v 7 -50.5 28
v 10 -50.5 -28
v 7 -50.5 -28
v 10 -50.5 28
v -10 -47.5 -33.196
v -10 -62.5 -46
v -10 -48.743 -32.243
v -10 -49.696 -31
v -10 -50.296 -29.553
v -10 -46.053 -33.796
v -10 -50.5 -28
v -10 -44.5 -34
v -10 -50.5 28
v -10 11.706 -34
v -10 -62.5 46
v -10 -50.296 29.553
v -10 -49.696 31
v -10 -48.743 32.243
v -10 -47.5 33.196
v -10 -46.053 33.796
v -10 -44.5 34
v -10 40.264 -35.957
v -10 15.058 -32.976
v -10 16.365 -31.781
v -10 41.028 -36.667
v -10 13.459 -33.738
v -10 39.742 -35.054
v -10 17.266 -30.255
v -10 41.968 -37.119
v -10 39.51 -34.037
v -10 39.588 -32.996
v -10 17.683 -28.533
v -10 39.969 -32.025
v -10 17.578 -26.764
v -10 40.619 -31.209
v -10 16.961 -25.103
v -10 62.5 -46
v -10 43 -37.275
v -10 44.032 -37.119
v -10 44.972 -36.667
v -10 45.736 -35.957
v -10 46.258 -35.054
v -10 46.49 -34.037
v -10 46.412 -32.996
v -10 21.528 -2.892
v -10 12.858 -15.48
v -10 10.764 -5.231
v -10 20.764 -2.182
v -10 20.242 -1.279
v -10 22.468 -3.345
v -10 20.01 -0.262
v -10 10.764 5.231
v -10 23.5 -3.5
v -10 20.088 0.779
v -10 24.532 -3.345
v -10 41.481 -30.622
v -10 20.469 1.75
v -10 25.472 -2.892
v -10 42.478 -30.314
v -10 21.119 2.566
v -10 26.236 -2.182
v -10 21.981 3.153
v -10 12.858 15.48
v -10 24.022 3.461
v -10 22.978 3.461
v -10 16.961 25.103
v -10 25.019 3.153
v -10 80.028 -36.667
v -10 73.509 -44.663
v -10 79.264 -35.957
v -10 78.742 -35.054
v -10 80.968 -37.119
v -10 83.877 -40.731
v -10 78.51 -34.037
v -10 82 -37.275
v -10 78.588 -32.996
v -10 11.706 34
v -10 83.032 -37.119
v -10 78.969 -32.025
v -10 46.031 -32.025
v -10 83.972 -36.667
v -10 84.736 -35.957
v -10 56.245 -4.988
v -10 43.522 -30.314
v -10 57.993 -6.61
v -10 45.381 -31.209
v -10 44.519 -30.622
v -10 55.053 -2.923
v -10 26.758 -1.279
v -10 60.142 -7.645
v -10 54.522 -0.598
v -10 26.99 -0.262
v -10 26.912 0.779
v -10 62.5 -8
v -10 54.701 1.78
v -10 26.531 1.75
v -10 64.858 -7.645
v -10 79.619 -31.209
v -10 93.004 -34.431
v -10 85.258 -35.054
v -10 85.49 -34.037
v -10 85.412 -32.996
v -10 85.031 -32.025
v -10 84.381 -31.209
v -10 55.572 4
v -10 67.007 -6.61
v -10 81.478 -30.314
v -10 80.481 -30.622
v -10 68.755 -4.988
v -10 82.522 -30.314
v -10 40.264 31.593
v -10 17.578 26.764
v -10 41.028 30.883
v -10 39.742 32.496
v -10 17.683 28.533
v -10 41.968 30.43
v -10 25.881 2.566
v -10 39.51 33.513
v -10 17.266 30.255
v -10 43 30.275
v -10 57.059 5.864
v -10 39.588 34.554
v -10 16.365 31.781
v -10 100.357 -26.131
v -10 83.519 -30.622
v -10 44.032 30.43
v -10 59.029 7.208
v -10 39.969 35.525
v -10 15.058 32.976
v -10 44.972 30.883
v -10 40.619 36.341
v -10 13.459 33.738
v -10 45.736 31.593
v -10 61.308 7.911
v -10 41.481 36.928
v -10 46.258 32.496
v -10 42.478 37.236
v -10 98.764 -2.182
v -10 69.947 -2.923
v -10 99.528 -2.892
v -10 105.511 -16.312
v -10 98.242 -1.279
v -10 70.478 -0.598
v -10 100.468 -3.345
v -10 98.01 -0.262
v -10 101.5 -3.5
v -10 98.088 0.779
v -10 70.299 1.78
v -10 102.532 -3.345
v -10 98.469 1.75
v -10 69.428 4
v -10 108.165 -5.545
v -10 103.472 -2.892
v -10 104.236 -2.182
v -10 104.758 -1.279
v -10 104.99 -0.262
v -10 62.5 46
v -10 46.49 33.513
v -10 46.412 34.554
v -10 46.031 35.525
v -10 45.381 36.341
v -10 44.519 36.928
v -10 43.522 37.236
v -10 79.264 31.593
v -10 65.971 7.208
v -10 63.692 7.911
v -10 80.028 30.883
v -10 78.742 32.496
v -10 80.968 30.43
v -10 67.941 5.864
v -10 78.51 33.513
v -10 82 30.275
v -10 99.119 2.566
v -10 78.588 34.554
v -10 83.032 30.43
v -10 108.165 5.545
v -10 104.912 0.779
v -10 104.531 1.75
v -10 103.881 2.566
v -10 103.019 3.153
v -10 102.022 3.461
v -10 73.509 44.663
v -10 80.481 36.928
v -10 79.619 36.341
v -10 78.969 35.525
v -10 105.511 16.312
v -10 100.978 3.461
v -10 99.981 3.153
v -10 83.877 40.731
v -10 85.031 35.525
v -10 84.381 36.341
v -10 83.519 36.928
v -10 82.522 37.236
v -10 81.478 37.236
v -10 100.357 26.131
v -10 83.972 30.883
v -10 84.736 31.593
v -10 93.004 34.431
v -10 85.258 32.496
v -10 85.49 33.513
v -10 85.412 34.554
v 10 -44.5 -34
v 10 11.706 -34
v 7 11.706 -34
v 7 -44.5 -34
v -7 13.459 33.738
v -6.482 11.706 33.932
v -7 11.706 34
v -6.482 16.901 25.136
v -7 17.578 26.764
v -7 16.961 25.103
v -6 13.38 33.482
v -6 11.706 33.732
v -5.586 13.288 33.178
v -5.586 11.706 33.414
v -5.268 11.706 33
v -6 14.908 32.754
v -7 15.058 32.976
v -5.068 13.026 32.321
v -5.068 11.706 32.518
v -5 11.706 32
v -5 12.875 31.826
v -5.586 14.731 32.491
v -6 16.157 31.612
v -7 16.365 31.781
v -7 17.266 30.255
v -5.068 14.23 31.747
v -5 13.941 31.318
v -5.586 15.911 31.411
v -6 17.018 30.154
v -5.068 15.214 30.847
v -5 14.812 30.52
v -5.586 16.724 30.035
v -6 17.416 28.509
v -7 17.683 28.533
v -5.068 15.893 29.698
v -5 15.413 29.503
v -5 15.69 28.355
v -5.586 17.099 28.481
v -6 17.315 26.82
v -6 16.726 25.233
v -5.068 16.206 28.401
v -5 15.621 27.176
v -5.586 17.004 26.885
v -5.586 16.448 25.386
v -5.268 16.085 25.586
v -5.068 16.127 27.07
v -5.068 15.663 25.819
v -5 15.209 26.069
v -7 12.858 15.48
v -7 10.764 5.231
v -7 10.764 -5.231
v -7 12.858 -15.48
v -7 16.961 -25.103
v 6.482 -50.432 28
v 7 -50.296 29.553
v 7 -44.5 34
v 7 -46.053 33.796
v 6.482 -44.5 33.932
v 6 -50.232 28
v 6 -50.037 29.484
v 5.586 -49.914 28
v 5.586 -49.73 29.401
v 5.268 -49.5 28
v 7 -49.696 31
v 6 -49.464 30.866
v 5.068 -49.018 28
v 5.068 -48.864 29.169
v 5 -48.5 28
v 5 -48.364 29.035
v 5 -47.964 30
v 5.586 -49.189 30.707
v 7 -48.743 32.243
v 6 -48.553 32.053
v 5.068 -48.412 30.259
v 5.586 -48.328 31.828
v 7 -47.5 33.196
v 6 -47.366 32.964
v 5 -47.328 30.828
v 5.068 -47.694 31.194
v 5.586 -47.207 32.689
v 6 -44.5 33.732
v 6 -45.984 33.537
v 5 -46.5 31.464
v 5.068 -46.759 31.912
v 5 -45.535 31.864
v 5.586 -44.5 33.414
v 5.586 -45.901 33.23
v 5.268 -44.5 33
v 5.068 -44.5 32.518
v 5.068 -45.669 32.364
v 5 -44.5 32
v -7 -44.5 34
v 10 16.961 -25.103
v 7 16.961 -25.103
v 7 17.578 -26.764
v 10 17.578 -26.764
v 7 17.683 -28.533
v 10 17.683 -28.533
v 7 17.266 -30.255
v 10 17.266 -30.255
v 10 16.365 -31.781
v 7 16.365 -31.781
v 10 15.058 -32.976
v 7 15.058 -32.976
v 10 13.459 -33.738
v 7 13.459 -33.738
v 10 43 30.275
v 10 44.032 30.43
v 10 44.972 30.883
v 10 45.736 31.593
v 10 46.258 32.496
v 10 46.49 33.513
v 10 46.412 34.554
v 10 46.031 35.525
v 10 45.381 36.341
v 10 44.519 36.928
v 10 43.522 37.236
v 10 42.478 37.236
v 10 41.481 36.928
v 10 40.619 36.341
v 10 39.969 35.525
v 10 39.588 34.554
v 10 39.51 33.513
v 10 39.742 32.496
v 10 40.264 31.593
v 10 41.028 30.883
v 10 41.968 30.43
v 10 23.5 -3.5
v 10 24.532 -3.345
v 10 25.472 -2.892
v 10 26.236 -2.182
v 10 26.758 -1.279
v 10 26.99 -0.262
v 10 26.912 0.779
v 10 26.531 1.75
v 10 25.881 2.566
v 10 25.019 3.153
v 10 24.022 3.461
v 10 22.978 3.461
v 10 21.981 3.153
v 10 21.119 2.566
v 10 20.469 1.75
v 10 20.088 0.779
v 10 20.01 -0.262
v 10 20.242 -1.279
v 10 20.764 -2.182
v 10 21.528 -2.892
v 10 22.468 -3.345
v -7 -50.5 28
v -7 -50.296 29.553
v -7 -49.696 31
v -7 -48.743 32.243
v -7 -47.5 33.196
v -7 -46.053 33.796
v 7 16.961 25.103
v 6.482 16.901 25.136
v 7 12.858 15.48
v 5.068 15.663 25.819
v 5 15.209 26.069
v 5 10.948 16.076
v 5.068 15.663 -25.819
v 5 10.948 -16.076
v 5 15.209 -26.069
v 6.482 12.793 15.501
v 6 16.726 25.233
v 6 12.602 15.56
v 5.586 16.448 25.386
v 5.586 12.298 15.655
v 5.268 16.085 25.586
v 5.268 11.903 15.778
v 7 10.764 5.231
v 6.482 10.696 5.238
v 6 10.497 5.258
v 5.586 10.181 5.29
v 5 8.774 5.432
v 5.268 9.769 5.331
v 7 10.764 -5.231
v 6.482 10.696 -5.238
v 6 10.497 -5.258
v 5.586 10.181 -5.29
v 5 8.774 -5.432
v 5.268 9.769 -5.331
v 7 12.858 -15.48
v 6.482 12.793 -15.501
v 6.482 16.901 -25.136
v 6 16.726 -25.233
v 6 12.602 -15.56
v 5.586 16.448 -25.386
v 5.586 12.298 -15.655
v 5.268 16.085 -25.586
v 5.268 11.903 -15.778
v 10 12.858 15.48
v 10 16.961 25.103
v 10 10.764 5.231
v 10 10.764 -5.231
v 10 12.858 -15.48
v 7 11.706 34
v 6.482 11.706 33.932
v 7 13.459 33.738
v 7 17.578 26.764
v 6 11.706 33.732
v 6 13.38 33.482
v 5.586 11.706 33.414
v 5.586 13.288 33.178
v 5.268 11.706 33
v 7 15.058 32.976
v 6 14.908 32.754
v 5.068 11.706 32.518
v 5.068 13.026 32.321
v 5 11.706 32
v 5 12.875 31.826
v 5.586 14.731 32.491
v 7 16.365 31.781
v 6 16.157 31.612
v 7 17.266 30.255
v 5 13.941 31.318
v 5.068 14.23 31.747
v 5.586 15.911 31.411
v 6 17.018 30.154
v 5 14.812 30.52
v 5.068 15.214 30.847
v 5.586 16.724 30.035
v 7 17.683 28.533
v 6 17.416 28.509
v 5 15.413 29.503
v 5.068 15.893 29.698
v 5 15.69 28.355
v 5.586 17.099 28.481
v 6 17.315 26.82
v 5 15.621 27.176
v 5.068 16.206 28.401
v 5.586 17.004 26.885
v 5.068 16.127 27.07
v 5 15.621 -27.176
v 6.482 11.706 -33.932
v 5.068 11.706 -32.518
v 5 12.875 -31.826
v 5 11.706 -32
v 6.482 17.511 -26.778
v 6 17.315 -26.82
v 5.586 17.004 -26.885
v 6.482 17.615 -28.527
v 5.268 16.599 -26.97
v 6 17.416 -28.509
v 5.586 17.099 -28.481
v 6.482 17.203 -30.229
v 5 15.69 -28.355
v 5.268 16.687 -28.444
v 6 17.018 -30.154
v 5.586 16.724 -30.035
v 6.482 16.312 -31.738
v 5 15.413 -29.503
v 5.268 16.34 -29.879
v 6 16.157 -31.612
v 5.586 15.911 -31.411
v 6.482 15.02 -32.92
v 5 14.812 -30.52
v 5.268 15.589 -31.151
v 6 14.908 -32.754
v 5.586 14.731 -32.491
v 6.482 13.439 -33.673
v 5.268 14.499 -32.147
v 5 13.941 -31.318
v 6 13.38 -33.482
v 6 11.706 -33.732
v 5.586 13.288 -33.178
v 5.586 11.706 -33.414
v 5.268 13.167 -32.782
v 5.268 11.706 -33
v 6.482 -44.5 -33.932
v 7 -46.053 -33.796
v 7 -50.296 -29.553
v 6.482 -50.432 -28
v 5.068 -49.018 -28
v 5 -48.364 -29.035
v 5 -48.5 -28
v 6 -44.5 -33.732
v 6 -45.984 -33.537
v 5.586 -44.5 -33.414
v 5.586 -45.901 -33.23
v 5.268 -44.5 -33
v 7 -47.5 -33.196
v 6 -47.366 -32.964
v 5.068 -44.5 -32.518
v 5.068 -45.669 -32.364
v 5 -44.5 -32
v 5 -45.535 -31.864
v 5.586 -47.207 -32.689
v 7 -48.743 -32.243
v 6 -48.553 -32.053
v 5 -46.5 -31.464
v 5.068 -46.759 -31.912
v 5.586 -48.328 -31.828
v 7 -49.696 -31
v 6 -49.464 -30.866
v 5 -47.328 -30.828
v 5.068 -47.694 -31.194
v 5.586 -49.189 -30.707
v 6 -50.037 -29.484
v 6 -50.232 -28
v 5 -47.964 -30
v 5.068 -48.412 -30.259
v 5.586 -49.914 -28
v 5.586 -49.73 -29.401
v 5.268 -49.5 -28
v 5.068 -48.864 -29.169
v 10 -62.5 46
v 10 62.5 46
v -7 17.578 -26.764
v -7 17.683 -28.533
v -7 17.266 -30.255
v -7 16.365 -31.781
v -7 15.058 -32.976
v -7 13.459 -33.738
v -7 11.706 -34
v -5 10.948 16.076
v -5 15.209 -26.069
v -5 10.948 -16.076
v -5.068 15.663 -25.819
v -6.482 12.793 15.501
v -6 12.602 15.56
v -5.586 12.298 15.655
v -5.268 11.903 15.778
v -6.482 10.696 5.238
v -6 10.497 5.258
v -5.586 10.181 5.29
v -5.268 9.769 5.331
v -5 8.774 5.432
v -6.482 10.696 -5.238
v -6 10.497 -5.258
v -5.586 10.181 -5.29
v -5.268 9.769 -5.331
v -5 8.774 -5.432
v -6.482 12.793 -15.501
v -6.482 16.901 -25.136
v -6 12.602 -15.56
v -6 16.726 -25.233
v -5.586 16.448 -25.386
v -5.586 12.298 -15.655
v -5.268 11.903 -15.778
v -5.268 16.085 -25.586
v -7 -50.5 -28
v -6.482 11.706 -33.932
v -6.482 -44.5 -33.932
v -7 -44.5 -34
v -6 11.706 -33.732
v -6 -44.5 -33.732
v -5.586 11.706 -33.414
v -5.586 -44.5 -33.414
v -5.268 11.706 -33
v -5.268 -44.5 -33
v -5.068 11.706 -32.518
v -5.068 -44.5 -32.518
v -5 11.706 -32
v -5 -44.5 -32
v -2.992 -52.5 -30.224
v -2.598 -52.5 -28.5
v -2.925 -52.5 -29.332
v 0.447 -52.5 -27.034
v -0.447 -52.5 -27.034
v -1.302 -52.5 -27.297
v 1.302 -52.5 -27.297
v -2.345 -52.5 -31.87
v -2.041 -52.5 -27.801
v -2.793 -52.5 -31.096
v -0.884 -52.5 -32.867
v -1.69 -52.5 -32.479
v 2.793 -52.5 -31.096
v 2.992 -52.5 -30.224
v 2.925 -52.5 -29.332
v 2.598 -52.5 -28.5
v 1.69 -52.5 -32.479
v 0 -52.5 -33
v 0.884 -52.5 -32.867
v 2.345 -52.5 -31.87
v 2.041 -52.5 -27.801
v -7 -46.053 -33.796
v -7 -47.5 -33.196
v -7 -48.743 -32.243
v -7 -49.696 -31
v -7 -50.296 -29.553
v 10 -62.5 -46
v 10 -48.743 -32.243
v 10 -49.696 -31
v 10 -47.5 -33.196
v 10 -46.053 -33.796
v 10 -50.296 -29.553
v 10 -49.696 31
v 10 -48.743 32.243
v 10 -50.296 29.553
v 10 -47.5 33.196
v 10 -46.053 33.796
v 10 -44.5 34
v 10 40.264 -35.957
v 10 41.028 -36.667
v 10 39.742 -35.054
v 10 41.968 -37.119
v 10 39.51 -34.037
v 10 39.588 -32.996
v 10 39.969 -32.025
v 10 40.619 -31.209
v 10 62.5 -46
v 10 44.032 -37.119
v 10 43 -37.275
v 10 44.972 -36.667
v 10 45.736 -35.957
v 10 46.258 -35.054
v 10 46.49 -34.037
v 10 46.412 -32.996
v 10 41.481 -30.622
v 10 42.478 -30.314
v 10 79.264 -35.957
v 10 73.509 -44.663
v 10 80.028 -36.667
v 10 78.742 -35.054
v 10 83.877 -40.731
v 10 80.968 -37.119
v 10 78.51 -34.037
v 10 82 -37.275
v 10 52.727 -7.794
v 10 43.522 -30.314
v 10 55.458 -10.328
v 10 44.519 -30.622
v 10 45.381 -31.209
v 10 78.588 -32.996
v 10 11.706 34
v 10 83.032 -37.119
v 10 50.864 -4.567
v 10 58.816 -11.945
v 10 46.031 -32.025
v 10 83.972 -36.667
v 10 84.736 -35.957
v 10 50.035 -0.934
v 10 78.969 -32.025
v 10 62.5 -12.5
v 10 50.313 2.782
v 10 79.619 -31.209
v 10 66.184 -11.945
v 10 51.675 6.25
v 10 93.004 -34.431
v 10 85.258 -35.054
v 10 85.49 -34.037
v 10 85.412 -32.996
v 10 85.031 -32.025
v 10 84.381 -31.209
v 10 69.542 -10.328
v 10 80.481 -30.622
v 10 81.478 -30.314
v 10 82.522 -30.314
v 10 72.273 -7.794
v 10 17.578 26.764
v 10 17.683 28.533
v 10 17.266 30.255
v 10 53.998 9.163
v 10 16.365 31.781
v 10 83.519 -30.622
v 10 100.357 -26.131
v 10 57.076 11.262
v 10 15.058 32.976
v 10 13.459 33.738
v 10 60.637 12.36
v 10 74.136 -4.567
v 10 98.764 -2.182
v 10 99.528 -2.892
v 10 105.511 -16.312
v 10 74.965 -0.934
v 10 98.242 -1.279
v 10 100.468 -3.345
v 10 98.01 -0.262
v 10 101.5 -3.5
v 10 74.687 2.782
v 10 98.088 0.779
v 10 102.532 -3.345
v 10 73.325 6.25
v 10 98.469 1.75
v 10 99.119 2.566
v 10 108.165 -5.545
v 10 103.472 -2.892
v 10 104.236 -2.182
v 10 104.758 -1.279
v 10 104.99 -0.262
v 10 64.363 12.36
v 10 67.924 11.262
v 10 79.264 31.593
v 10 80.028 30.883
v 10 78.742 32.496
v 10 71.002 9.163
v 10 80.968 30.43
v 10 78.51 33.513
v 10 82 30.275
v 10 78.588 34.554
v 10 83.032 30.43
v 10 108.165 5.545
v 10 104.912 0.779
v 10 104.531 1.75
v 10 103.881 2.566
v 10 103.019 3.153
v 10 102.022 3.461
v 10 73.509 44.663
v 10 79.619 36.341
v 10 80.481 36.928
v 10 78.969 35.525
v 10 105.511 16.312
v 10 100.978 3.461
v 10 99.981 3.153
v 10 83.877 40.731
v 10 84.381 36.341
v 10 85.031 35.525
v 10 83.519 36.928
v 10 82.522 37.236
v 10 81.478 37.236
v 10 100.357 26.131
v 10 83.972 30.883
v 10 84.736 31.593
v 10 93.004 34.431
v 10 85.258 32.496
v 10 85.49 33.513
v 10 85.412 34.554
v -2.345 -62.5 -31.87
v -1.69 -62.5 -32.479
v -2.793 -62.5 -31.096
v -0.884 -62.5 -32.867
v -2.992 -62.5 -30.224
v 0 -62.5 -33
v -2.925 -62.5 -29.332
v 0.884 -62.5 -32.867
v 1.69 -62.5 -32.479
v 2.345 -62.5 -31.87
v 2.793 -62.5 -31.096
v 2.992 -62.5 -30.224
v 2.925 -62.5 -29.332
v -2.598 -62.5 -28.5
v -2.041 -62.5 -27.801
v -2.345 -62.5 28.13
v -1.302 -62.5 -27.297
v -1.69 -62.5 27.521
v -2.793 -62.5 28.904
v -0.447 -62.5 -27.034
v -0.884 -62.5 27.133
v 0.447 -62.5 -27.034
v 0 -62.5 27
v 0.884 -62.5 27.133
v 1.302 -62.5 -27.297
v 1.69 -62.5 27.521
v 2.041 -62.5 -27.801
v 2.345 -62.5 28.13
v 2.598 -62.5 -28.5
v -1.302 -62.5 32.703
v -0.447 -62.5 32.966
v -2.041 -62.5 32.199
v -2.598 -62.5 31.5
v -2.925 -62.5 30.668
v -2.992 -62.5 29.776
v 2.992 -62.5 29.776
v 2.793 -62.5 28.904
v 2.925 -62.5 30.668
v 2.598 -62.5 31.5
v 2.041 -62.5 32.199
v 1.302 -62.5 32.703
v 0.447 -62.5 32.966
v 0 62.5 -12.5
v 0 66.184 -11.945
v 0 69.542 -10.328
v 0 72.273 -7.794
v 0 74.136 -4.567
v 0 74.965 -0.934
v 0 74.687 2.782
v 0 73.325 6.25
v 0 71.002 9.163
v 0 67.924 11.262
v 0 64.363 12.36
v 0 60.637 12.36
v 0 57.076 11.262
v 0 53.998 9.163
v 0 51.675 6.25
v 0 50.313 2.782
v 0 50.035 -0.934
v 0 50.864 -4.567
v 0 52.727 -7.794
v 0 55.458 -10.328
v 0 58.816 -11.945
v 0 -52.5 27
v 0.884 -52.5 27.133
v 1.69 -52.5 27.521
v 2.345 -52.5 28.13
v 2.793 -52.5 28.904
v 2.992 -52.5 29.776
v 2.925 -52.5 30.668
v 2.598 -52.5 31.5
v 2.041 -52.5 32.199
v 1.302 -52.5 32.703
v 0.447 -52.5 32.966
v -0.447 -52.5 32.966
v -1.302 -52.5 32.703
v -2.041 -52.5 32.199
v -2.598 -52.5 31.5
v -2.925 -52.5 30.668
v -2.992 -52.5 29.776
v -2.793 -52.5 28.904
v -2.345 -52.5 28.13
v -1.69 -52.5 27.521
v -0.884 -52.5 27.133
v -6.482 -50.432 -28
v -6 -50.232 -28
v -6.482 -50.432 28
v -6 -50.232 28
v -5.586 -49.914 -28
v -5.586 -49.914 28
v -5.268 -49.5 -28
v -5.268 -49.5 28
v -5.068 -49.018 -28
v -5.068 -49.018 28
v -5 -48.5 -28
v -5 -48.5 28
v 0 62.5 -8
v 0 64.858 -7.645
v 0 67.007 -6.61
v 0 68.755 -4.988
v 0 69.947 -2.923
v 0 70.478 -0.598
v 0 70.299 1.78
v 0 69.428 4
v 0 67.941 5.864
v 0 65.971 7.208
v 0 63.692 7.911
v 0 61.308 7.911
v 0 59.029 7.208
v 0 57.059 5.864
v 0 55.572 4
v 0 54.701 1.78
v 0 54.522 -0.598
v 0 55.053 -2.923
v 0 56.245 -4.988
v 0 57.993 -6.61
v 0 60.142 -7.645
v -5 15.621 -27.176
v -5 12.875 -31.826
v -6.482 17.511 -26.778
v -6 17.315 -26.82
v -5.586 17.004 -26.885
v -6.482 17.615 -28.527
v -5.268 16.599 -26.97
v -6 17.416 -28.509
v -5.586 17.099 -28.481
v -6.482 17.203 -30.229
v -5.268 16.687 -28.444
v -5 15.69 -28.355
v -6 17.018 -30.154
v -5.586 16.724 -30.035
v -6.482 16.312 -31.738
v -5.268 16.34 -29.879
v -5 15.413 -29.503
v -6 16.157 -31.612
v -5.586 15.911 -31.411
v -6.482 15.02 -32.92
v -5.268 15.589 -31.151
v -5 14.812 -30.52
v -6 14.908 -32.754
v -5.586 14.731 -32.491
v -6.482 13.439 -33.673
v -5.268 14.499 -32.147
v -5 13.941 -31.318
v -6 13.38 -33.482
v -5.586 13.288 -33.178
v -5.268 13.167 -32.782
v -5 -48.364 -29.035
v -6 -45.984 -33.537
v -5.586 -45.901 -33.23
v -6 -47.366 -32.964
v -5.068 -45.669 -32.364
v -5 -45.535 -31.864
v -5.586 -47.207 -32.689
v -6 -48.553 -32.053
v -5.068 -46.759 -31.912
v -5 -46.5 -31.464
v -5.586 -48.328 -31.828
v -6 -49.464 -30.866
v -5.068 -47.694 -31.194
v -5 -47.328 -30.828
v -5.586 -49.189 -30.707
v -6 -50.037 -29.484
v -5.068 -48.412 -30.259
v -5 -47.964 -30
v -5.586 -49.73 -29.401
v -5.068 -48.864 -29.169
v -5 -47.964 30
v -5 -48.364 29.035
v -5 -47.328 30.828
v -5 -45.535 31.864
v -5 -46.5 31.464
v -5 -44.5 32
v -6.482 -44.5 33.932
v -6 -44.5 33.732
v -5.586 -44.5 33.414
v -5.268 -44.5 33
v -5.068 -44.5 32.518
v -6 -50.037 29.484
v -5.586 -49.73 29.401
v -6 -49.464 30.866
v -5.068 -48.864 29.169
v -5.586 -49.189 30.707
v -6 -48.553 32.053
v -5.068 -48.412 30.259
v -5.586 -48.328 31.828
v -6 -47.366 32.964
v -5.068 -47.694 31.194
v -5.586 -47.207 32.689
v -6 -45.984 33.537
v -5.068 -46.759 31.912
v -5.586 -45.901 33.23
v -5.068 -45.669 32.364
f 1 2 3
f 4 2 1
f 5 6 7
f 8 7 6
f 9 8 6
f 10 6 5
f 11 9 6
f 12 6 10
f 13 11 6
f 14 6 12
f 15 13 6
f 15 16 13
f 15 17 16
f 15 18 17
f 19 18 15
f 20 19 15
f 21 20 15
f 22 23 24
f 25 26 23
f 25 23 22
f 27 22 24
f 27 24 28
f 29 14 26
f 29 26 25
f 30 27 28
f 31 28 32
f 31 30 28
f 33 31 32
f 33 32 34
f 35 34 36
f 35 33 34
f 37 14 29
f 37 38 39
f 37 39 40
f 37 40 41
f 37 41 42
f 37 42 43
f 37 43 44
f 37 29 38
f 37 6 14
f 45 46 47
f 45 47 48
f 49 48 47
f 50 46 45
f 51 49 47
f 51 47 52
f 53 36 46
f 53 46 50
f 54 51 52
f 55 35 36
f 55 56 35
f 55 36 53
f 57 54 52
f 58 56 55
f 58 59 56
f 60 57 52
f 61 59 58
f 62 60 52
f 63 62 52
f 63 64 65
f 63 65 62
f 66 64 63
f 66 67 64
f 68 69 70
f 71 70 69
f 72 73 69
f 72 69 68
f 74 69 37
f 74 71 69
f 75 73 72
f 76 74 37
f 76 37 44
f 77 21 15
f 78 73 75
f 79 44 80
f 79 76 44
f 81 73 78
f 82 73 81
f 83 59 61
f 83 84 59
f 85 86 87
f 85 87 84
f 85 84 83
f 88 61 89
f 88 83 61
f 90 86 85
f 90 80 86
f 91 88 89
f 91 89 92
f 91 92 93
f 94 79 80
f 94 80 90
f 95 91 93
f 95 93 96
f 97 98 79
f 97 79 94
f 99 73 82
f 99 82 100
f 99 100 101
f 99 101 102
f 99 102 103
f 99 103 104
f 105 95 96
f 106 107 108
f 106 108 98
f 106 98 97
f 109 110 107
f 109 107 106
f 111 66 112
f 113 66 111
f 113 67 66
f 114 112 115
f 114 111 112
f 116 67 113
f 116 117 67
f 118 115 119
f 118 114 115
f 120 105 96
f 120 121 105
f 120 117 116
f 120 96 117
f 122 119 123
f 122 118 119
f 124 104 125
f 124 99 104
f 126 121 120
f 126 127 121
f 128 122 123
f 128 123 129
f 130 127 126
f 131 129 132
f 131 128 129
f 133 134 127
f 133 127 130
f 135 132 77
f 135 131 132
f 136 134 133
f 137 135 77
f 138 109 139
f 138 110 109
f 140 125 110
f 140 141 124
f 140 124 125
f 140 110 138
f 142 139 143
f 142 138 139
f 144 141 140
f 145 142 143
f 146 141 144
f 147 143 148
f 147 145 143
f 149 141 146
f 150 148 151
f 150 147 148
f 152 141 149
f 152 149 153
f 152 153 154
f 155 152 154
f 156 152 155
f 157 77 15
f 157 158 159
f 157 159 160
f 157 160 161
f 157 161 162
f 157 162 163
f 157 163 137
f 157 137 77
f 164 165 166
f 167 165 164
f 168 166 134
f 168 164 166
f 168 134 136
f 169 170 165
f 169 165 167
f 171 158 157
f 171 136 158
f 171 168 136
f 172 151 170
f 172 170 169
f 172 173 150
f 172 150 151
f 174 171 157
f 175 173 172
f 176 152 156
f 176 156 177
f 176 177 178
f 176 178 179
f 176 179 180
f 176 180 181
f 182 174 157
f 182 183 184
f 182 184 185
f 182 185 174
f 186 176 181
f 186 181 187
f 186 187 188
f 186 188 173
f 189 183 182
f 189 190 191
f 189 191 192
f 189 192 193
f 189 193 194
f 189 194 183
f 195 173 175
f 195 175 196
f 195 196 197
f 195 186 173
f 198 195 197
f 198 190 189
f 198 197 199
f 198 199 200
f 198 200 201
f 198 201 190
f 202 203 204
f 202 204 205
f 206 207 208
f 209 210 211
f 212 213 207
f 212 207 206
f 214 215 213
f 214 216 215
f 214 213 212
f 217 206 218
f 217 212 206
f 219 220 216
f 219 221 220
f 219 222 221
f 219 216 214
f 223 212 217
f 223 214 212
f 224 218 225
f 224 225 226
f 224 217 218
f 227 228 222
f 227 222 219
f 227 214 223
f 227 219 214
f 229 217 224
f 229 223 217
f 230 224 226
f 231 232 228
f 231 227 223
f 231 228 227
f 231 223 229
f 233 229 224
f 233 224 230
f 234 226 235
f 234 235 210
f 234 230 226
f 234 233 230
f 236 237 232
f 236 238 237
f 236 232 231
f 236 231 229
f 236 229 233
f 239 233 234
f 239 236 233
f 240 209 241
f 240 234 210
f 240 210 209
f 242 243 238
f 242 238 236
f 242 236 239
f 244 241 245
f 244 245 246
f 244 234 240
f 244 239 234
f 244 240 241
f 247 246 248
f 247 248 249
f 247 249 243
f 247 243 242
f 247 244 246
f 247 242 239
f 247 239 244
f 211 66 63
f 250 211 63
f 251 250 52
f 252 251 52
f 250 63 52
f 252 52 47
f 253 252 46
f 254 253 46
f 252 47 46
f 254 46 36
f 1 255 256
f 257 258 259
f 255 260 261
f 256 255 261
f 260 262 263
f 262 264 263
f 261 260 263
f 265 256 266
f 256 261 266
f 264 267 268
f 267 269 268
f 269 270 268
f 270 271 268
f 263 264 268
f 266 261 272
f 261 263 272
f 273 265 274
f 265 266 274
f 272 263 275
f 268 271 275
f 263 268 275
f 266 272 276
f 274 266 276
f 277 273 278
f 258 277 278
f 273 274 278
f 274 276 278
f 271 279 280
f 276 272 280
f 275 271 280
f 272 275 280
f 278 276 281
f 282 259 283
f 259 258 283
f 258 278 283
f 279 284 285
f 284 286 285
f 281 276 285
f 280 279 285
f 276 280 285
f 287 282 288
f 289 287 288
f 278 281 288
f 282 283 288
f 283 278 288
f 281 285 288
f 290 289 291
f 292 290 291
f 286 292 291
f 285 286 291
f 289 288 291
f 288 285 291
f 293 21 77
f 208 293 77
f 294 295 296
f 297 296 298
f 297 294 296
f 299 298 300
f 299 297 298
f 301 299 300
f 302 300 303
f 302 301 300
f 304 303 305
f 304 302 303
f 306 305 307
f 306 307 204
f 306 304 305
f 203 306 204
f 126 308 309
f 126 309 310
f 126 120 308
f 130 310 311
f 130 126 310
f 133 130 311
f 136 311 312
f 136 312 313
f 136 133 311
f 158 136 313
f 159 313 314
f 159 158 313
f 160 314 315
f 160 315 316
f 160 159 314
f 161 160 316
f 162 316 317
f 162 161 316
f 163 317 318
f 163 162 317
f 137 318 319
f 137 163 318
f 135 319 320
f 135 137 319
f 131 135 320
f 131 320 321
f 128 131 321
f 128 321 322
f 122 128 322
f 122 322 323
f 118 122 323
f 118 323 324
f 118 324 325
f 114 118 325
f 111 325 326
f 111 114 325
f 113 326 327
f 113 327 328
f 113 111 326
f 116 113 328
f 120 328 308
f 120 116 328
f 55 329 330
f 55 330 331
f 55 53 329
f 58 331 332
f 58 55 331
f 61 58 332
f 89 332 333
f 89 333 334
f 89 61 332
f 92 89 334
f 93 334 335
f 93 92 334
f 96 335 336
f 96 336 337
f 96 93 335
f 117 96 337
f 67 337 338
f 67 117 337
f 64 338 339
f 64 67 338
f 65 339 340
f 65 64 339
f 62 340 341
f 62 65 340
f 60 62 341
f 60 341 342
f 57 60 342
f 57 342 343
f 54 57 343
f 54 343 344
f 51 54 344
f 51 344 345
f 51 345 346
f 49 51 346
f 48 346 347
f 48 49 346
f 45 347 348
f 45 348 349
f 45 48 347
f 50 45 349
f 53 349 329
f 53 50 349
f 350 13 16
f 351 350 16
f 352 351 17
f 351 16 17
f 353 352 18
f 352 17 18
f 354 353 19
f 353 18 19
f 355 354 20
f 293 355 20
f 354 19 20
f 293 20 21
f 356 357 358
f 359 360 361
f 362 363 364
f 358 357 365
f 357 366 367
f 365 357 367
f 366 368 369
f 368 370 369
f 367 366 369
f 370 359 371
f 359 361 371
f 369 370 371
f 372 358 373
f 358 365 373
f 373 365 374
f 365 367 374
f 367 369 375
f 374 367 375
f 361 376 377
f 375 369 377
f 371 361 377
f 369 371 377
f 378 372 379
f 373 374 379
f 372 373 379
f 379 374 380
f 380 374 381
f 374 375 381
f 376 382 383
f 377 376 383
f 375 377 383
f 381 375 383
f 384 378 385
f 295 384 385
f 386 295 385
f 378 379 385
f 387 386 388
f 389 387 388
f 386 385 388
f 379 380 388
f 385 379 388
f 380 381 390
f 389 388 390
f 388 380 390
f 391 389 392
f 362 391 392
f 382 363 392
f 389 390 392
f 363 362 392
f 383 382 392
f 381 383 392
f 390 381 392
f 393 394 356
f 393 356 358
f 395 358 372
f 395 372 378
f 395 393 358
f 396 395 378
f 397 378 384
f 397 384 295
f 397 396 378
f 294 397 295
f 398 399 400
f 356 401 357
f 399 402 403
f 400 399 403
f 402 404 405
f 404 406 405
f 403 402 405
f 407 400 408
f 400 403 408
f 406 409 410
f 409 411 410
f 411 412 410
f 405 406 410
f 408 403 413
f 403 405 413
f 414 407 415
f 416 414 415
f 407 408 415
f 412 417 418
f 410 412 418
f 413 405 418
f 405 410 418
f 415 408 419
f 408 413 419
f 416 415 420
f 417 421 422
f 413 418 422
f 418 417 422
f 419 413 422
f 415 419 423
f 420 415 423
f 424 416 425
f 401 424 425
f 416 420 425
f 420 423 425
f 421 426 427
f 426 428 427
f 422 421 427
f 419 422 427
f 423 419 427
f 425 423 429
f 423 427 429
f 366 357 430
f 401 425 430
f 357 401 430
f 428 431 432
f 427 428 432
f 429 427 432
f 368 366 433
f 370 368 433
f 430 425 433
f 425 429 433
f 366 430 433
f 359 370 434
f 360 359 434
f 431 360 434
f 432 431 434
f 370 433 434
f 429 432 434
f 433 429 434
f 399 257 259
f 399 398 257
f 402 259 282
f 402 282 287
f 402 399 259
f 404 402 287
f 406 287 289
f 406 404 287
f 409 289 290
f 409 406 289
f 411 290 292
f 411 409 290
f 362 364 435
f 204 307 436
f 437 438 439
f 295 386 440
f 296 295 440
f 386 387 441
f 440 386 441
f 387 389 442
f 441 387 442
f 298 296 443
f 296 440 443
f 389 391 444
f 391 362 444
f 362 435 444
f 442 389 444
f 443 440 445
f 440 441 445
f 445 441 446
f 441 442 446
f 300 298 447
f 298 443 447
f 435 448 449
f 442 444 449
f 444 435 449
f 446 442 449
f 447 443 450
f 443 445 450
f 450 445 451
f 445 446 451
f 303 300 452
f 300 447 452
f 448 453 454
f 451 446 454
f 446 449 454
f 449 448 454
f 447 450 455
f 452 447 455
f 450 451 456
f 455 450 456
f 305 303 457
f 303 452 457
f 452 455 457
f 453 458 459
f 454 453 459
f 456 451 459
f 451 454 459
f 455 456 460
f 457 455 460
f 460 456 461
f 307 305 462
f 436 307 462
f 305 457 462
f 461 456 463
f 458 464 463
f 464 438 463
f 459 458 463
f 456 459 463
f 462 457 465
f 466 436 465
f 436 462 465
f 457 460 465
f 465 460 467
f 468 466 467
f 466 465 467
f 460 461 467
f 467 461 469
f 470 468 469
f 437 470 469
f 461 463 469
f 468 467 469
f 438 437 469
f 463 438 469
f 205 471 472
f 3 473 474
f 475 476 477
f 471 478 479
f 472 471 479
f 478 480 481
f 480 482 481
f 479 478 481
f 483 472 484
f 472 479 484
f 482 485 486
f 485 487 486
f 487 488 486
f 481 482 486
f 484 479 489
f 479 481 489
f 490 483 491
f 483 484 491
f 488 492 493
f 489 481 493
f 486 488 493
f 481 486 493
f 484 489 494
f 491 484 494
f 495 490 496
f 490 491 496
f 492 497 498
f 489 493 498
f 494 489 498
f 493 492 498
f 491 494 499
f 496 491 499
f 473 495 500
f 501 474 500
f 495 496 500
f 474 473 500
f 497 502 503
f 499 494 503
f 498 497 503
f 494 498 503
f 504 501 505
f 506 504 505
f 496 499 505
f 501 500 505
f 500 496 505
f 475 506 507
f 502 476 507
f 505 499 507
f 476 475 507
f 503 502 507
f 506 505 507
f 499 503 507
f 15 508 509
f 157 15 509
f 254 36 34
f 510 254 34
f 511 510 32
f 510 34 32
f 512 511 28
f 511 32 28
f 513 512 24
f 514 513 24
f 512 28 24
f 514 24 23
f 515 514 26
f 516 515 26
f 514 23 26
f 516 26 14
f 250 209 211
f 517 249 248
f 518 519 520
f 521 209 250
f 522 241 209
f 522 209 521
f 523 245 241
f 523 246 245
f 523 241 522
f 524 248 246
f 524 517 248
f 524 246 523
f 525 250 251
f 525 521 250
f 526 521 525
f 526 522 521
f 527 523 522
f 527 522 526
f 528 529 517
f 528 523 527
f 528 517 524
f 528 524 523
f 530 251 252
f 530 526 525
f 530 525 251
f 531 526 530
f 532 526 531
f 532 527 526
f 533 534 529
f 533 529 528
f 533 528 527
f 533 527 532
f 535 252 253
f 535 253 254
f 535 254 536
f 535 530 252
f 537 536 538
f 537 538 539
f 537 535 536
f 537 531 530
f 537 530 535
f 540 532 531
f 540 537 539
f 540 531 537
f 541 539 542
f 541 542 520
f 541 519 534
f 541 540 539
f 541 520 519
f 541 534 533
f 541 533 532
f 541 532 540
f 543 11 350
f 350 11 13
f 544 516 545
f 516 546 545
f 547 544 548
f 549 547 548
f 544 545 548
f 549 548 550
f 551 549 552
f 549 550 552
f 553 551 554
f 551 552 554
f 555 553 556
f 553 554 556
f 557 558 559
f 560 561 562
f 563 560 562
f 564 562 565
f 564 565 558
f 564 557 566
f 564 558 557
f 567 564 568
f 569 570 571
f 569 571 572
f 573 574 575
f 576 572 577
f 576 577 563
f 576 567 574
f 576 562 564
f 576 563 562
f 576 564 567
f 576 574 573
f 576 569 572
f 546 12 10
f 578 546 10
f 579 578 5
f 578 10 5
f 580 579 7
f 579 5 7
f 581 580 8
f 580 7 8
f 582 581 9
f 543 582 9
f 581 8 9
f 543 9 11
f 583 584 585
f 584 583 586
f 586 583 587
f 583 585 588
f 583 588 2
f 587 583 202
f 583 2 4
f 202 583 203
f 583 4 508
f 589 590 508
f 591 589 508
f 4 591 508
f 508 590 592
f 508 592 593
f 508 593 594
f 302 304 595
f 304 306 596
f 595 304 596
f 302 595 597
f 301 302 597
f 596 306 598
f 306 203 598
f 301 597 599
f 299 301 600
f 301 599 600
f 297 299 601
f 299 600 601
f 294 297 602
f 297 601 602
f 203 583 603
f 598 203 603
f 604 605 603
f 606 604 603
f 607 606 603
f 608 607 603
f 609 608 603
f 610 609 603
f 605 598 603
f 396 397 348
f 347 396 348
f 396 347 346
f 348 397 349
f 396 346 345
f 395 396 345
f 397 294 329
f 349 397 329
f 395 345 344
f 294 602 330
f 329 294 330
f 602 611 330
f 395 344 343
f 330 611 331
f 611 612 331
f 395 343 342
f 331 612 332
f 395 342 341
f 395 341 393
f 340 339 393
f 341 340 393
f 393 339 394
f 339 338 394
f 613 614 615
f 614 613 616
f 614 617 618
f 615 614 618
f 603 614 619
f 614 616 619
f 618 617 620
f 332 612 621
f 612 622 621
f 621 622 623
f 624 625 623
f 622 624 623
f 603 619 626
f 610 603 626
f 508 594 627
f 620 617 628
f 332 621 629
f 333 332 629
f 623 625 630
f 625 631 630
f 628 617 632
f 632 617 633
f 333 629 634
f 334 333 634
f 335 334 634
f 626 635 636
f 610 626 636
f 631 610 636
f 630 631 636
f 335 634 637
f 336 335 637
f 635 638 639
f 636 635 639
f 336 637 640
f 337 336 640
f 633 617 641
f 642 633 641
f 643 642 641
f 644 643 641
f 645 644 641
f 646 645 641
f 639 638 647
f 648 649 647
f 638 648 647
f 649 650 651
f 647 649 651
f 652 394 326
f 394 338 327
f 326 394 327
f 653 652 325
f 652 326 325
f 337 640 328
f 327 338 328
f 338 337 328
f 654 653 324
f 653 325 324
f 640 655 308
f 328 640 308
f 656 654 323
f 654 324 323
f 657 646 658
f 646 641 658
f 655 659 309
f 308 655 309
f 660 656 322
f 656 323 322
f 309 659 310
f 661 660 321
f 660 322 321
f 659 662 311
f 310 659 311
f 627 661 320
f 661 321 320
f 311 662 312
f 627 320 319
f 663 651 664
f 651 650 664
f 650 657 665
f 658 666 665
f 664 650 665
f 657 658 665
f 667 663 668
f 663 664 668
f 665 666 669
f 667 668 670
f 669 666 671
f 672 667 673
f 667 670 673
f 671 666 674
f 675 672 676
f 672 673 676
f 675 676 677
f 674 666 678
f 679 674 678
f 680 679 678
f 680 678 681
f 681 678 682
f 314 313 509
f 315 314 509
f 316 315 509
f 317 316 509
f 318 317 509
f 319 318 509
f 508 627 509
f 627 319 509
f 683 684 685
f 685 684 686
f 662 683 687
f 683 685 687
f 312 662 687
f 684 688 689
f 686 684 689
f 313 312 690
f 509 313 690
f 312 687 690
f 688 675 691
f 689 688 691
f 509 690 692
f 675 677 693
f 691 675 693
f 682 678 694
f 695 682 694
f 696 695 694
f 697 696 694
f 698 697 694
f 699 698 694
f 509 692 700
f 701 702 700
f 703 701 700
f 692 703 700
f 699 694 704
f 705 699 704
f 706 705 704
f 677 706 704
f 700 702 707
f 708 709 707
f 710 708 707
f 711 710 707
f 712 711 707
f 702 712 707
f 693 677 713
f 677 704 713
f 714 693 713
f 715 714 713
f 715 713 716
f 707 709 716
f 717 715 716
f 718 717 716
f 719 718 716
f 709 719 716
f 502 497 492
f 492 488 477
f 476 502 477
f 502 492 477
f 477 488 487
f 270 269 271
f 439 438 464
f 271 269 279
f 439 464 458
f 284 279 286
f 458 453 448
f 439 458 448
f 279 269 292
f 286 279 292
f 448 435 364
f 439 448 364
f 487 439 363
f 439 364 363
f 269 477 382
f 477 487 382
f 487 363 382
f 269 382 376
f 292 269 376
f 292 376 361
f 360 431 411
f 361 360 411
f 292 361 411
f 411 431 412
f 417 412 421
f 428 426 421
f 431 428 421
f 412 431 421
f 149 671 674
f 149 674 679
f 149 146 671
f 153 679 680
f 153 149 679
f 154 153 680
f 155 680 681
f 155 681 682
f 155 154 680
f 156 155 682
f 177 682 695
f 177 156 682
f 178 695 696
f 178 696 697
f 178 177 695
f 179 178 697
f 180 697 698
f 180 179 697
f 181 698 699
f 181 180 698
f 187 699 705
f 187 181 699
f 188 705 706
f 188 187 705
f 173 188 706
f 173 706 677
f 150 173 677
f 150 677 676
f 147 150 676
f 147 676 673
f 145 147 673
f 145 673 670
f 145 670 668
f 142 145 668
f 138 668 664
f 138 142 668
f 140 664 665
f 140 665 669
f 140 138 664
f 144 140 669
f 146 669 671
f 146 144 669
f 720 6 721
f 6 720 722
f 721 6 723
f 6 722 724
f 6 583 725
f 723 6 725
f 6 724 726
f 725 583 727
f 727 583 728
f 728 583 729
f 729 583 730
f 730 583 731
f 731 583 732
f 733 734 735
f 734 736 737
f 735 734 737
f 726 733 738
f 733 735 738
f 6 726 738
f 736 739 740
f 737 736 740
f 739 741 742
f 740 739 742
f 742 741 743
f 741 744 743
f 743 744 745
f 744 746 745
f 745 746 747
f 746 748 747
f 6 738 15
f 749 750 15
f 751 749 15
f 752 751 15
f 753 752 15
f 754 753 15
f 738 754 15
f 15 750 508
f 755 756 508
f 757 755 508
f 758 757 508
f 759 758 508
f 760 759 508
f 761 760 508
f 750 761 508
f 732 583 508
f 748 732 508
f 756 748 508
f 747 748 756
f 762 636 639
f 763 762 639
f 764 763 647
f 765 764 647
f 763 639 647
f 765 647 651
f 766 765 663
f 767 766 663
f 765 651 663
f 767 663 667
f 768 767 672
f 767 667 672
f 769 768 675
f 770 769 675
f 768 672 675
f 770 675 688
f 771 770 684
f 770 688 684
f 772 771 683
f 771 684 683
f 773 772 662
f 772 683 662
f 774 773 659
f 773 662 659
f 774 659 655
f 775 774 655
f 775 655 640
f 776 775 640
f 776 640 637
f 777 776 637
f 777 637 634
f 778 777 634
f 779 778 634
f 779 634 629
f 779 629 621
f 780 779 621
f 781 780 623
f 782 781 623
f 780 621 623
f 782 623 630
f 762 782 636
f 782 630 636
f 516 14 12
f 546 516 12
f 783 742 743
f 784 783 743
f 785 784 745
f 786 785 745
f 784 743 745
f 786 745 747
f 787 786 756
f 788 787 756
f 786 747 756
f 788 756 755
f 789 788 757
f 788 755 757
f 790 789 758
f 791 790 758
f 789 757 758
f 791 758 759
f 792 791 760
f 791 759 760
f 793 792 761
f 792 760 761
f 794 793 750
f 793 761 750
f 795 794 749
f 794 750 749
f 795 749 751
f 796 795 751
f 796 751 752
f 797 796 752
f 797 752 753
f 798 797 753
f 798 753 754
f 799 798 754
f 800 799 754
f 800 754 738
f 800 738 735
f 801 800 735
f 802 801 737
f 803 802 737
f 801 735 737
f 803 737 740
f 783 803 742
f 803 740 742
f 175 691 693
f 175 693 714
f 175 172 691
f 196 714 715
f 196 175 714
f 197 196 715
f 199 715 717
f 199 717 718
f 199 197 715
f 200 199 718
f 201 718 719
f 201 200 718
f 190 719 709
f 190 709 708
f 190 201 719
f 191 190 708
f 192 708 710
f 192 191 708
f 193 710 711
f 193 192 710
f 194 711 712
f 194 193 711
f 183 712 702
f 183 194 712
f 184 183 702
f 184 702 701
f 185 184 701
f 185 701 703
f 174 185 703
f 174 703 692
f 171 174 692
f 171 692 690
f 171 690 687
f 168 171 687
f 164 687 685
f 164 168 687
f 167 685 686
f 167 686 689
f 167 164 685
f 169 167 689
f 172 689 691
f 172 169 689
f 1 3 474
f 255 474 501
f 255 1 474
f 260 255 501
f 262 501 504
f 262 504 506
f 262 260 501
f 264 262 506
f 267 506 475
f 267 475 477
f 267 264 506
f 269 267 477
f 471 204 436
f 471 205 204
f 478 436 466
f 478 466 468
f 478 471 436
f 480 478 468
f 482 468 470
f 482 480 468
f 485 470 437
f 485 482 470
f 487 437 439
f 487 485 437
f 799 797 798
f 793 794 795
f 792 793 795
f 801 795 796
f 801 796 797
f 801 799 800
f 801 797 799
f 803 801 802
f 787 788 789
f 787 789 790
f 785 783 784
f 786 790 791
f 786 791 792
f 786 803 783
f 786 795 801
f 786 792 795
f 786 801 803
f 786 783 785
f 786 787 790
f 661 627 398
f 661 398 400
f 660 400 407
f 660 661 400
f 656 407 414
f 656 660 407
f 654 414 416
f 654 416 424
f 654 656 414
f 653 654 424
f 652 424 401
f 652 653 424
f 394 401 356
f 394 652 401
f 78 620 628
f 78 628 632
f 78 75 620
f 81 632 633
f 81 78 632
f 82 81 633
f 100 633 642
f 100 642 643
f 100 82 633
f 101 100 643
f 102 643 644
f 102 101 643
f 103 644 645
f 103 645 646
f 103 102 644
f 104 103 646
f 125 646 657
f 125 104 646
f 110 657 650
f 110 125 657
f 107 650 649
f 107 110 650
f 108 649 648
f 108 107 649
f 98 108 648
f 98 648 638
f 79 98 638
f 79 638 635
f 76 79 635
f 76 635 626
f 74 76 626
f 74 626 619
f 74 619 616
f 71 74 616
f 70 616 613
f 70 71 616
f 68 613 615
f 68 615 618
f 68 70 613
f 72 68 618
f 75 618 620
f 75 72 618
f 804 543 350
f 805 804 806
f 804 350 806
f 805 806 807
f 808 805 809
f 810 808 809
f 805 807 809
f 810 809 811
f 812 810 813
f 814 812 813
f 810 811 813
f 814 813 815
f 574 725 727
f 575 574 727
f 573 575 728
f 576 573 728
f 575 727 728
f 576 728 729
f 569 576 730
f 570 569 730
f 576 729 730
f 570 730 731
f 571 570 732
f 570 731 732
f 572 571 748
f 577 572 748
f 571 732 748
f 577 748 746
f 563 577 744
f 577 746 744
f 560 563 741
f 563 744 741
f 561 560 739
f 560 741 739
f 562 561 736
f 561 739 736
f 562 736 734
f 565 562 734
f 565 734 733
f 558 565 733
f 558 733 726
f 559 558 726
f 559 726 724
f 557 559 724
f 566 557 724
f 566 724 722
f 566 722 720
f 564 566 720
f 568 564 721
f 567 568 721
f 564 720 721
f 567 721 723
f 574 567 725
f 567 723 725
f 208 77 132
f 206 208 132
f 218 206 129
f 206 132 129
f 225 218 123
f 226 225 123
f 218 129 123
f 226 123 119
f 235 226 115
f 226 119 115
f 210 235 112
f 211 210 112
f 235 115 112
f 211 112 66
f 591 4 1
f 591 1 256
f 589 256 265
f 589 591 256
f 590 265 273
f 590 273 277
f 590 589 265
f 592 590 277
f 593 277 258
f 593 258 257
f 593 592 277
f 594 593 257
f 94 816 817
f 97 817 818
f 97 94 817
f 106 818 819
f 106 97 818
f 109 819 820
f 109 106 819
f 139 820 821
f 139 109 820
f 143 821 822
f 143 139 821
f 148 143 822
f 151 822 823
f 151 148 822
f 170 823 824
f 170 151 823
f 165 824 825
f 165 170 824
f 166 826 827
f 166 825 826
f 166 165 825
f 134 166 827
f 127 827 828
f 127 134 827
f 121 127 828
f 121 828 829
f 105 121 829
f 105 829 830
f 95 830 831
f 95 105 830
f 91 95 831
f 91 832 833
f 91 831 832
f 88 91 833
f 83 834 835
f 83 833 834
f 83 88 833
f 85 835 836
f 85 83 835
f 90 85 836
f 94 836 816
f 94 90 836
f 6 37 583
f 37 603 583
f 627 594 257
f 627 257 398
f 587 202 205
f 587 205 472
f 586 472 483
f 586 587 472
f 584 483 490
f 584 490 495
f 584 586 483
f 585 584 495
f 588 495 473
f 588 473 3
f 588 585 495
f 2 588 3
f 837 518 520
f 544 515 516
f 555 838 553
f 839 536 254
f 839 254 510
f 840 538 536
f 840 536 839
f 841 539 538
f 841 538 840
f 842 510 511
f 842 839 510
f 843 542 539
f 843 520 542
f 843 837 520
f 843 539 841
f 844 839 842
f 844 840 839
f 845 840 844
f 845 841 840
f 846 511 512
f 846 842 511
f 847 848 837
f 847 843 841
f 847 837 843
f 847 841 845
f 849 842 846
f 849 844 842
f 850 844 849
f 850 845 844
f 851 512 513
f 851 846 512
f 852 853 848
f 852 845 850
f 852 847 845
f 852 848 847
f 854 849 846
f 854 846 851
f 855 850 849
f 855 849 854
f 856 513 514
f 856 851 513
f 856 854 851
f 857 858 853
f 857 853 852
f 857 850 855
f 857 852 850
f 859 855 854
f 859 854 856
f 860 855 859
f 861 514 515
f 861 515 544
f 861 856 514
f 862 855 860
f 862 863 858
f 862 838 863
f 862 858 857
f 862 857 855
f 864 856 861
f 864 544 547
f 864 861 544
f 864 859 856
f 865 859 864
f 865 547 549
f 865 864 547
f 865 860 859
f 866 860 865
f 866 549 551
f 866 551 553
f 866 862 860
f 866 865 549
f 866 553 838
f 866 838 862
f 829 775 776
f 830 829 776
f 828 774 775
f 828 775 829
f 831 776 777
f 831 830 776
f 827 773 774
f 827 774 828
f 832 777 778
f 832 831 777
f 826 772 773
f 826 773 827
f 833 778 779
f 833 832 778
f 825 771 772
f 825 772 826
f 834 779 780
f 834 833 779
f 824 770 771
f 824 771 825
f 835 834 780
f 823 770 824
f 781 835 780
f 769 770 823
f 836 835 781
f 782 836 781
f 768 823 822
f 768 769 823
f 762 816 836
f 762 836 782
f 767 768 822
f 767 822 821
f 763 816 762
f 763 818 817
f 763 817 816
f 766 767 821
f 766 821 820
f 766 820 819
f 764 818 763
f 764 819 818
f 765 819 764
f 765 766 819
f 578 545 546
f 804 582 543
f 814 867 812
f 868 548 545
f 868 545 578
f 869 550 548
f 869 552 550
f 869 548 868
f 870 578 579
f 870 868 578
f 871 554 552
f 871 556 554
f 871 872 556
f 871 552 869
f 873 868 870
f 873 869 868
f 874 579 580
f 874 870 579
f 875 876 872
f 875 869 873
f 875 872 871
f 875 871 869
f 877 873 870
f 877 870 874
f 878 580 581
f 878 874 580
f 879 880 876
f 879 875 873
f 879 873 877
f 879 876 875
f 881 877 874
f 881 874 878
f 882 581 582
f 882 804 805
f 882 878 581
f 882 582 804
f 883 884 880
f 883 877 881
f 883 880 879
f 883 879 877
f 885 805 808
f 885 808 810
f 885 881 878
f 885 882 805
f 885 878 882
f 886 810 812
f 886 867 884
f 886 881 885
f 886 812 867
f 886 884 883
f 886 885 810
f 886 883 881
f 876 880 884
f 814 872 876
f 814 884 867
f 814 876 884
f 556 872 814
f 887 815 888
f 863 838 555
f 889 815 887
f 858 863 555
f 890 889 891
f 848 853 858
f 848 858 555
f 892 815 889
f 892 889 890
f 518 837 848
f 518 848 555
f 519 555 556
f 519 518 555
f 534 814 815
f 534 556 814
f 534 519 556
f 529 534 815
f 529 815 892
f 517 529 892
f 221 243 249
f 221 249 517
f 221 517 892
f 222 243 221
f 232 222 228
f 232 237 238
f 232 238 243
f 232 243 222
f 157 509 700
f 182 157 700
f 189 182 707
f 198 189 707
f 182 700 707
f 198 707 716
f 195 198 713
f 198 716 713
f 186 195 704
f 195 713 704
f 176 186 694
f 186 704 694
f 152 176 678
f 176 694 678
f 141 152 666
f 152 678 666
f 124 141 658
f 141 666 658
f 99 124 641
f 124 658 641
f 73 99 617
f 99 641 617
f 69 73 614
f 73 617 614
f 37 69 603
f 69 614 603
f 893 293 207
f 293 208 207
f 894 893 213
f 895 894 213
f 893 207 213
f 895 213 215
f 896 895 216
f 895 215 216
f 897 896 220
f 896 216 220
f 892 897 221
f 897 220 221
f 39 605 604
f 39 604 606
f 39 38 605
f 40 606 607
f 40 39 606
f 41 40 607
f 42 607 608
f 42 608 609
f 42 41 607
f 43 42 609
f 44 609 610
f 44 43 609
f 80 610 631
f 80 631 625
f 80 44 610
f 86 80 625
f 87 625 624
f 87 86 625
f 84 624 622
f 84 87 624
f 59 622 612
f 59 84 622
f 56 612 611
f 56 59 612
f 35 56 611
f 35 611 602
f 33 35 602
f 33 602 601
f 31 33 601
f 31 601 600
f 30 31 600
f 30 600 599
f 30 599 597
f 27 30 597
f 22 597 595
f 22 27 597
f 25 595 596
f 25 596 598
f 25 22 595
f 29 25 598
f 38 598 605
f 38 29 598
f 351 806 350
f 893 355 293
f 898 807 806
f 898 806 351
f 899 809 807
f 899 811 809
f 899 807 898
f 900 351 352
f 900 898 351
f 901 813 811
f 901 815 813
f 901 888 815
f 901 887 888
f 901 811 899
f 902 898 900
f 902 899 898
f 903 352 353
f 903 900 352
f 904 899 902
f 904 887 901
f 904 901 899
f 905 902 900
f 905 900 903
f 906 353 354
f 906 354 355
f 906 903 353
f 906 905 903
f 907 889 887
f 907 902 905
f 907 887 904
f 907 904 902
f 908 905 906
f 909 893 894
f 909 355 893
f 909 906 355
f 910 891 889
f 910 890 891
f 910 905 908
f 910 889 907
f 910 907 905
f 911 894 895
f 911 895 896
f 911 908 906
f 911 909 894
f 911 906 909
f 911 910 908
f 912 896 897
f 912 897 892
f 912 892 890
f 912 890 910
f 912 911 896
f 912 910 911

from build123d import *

# Parameters (mm, degrees)
SKETCH1_R            = 3.5
SKETCH1_R_2          = 8
BOSS_EXTRUDE1_DEPTH  = 10
CUT_EXTRUDE1_DEPTH   = 5
FILLET1_R            = 2
SKETCH3_R            = 12.5
CUT_EXTRUDE2_DEPTH   = 10
FILLET1_OF_MIRROR1_R = 2
SKETCH6_R            = 3
CUT_EXTRUDE3_DEPTH   = 10


with BuildPart() as part:
    # Sketch1 → Boss-Extrude1 (new, symmetric)
    # profile 1 of 2: a face of its own
    with BuildSketch(Plane(origin=(0, 0, 0), x_dir=(0, 0, -1), z_dir=(1, 0, 0))):
        with BuildLine():
            ThreePointArc((-46, 62.5), (0, 108.5), (46, 62.5))
            Line((46, 62.5), (46, -62.5))
            Line((46, -62.5), (-46, -62.5))
            Line((-46, -62.5), (-46, 62.5))
        make_face()
        with Locations((-33.774990748, 82)):
            Circle(SKETCH1_R, mode=Mode.SUBTRACT)
        with Locations((-33.774990748, 43)):
            Circle(SKETCH1_R, mode=Mode.SUBTRACT)
        with Locations((0, 23.5)):
            Circle(SKETCH1_R, mode=Mode.SUBTRACT)
        with Locations((33.774990748, 43)):
            Circle(SKETCH1_R, mode=Mode.SUBTRACT)
        with Locations((33.774990748, 82)):
            Circle(SKETCH1_R, mode=Mode.SUBTRACT)
        with Locations((0, 62.5)):
            Circle(SKETCH1_R_2, mode=Mode.SUBTRACT)
        with Locations((0, 101.5)):
            Circle(SKETCH1_R, mode=Mode.SUBTRACT)
        with BuildLine():
            ThreePointArc((-25.103448276, 16.960820334), (-31.051285766, 16.872502771), (-34, 11.706299603))
            Line((-34, 11.706299603), (-34, -44.5))
            ThreePointArc((-34, -44.5), (-32.242640687, -48.742640687), (-28, -50.5))
            Line((-28, -50.5), (28, -50.5))
            ThreePointArc((28, -50.5), (32.242640687, -48.742640687), (34, -44.5))
            Line((34, -44.5), (34, 11.706299603))
            ThreePointArc((34, 11.706299603), (31.051285766, 16.872502771), (25.103448276, 16.960820334))
            ThreePointArc((25.103448276, 16.960820334), (0, 10.5), (-25.103448276, 16.960820334))
        make_face(mode=Mode.SUBTRACT)
    # profile 2 of 2: a face of its own
    with BuildSketch(Plane(origin=(0, 0, 0), x_dir=(0, 0, -1), z_dir=(1, 0, 0))):
        with BuildLine():
            ThreePointArc((-25.103448276, 16.960820334), (0, 10.5), (25.103448276, 16.960820334))
            ThreePointArc((25.103448276, 16.960820334), (31.051285766, 16.872502771), (34, 11.706299603))
            Line((34, 11.706299603), (34, -44.5))
            ThreePointArc((34, -44.5), (32.242640687, -48.742640687), (28, -50.5))
            Line((28, -50.5), (-28, -50.5))
            ThreePointArc((-28, -50.5), (-32.242640687, -48.742640687), (-34, -44.5))
            Line((-34, -44.5), (-34, 11.706299603))
            ThreePointArc((-34, 11.706299603), (-31.051285766, 16.872502771), (-25.103448276, 16.960820334))
        make_face()
    extrude(amount=BOSS_EXTRUDE1_DEPTH, both=True)

    # Sketch2 → Cut-Extrude1 (cut)
    with BuildSketch(Plane(origin=(10, 0, 0), x_dir=(0, 0, -1), z_dir=(1, 0, 0))):
        with BuildLine():
            ThreePointArc((-25.103448276, 16.960820334), (0, 10.5), (25.103448276, 16.960820334))
            ThreePointArc((25.103448276, 16.960820334), (31.051285766, 16.872502771), (34, 11.706299603))
            Line((34, 11.706299603), (34, -44.5))
            ThreePointArc((34, -44.5), (32.242640687, -48.742640687), (28, -50.5))
            Line((28, -50.5), (-28, -50.5))
            ThreePointArc((-28, -50.5), (-32.242640687, -48.742640687), (-34, -44.5))
            Line((-34, -44.5), (-34, 11.706299603))
            ThreePointArc((-34, 11.706299603), (-31.051285766, 16.872502771), (-25.103448276, 16.960820334))
        make_face()
    cut_extrude1 = extrude(amount=-CUT_EXTRUDE1_DEPTH, mode=Mode.SUBTRACT)

    # Fillet1
    fillet1_edges = [part.edges().sort_by_distance(p)[0] for p in [
        (5, -16.396850198, -34),
        (5, 16.872502771, 31.051285766),
        (5, 10.5, 0),
        (5, 16.872502771, -31.051285766),
        (5, -48.742640687, -32.242640687),
        (5, -50.5, 0),
        (5, -48.742640687, 32.242640687),
        (5, -16.396850198, 34),
    ]]
    fillet(fillet1_edges, radius=FILLET1_R)

    # Sketch3 → Cut-Extrude2 (cut)
    with BuildSketch(Plane(origin=(10, 0, 0), x_dir=(0, 0, -1), z_dir=(1, 0, 0))):
        with Locations((0, 62.5)):
            Circle(SKETCH3_R)
    extrude(amount=-CUT_EXTRUDE2_DEPTH, mode=Mode.SUBTRACT)

    # Mirror1: Cut-Extrude1 across plane
    add(cut_extrude1.mirror(Plane(origin=(0, 0, 0), x_dir=(0, 0, 1), z_dir=(1, 0, 0))), mode=Mode.SUBTRACT)

    # Fillet1 of Mirror1
    fillet1_of_mirror1_edges = [part.edges().sort_by_distance(p)[0] for p in [
        (-5, -16.396850198, -34),
        (-5, 16.872502771, 31.051285766),
        (-5, 10.5, 0),
        (-5, 16.872502771, -31.051285766),
        (-5, -48.742640687, -32.242640687),
        (-5, -50.5, 0),
        (-5, -48.742640687, 32.242640687),
        (-5, -16.396850198, 34),
    ]]
    fillet(fillet1_of_mirror1_edges, radius=FILLET1_OF_MIRROR1_R)

    # Sketch6 → Cut-Extrude3 (cut)
    with BuildSketch(Plane.XZ.offset(62.5)):
        with Locations(Location((0, 30, 0), (0, 0, 270))):
            Circle(SKETCH6_R)
        with Locations(Location((0, -30, 0), (0, 0, 270))):
            Circle(SKETCH6_R)
    extrude(amount=-CUT_EXTRUDE3_DEPTH, mode=Mode.SUBTRACT)


solid = part.part
